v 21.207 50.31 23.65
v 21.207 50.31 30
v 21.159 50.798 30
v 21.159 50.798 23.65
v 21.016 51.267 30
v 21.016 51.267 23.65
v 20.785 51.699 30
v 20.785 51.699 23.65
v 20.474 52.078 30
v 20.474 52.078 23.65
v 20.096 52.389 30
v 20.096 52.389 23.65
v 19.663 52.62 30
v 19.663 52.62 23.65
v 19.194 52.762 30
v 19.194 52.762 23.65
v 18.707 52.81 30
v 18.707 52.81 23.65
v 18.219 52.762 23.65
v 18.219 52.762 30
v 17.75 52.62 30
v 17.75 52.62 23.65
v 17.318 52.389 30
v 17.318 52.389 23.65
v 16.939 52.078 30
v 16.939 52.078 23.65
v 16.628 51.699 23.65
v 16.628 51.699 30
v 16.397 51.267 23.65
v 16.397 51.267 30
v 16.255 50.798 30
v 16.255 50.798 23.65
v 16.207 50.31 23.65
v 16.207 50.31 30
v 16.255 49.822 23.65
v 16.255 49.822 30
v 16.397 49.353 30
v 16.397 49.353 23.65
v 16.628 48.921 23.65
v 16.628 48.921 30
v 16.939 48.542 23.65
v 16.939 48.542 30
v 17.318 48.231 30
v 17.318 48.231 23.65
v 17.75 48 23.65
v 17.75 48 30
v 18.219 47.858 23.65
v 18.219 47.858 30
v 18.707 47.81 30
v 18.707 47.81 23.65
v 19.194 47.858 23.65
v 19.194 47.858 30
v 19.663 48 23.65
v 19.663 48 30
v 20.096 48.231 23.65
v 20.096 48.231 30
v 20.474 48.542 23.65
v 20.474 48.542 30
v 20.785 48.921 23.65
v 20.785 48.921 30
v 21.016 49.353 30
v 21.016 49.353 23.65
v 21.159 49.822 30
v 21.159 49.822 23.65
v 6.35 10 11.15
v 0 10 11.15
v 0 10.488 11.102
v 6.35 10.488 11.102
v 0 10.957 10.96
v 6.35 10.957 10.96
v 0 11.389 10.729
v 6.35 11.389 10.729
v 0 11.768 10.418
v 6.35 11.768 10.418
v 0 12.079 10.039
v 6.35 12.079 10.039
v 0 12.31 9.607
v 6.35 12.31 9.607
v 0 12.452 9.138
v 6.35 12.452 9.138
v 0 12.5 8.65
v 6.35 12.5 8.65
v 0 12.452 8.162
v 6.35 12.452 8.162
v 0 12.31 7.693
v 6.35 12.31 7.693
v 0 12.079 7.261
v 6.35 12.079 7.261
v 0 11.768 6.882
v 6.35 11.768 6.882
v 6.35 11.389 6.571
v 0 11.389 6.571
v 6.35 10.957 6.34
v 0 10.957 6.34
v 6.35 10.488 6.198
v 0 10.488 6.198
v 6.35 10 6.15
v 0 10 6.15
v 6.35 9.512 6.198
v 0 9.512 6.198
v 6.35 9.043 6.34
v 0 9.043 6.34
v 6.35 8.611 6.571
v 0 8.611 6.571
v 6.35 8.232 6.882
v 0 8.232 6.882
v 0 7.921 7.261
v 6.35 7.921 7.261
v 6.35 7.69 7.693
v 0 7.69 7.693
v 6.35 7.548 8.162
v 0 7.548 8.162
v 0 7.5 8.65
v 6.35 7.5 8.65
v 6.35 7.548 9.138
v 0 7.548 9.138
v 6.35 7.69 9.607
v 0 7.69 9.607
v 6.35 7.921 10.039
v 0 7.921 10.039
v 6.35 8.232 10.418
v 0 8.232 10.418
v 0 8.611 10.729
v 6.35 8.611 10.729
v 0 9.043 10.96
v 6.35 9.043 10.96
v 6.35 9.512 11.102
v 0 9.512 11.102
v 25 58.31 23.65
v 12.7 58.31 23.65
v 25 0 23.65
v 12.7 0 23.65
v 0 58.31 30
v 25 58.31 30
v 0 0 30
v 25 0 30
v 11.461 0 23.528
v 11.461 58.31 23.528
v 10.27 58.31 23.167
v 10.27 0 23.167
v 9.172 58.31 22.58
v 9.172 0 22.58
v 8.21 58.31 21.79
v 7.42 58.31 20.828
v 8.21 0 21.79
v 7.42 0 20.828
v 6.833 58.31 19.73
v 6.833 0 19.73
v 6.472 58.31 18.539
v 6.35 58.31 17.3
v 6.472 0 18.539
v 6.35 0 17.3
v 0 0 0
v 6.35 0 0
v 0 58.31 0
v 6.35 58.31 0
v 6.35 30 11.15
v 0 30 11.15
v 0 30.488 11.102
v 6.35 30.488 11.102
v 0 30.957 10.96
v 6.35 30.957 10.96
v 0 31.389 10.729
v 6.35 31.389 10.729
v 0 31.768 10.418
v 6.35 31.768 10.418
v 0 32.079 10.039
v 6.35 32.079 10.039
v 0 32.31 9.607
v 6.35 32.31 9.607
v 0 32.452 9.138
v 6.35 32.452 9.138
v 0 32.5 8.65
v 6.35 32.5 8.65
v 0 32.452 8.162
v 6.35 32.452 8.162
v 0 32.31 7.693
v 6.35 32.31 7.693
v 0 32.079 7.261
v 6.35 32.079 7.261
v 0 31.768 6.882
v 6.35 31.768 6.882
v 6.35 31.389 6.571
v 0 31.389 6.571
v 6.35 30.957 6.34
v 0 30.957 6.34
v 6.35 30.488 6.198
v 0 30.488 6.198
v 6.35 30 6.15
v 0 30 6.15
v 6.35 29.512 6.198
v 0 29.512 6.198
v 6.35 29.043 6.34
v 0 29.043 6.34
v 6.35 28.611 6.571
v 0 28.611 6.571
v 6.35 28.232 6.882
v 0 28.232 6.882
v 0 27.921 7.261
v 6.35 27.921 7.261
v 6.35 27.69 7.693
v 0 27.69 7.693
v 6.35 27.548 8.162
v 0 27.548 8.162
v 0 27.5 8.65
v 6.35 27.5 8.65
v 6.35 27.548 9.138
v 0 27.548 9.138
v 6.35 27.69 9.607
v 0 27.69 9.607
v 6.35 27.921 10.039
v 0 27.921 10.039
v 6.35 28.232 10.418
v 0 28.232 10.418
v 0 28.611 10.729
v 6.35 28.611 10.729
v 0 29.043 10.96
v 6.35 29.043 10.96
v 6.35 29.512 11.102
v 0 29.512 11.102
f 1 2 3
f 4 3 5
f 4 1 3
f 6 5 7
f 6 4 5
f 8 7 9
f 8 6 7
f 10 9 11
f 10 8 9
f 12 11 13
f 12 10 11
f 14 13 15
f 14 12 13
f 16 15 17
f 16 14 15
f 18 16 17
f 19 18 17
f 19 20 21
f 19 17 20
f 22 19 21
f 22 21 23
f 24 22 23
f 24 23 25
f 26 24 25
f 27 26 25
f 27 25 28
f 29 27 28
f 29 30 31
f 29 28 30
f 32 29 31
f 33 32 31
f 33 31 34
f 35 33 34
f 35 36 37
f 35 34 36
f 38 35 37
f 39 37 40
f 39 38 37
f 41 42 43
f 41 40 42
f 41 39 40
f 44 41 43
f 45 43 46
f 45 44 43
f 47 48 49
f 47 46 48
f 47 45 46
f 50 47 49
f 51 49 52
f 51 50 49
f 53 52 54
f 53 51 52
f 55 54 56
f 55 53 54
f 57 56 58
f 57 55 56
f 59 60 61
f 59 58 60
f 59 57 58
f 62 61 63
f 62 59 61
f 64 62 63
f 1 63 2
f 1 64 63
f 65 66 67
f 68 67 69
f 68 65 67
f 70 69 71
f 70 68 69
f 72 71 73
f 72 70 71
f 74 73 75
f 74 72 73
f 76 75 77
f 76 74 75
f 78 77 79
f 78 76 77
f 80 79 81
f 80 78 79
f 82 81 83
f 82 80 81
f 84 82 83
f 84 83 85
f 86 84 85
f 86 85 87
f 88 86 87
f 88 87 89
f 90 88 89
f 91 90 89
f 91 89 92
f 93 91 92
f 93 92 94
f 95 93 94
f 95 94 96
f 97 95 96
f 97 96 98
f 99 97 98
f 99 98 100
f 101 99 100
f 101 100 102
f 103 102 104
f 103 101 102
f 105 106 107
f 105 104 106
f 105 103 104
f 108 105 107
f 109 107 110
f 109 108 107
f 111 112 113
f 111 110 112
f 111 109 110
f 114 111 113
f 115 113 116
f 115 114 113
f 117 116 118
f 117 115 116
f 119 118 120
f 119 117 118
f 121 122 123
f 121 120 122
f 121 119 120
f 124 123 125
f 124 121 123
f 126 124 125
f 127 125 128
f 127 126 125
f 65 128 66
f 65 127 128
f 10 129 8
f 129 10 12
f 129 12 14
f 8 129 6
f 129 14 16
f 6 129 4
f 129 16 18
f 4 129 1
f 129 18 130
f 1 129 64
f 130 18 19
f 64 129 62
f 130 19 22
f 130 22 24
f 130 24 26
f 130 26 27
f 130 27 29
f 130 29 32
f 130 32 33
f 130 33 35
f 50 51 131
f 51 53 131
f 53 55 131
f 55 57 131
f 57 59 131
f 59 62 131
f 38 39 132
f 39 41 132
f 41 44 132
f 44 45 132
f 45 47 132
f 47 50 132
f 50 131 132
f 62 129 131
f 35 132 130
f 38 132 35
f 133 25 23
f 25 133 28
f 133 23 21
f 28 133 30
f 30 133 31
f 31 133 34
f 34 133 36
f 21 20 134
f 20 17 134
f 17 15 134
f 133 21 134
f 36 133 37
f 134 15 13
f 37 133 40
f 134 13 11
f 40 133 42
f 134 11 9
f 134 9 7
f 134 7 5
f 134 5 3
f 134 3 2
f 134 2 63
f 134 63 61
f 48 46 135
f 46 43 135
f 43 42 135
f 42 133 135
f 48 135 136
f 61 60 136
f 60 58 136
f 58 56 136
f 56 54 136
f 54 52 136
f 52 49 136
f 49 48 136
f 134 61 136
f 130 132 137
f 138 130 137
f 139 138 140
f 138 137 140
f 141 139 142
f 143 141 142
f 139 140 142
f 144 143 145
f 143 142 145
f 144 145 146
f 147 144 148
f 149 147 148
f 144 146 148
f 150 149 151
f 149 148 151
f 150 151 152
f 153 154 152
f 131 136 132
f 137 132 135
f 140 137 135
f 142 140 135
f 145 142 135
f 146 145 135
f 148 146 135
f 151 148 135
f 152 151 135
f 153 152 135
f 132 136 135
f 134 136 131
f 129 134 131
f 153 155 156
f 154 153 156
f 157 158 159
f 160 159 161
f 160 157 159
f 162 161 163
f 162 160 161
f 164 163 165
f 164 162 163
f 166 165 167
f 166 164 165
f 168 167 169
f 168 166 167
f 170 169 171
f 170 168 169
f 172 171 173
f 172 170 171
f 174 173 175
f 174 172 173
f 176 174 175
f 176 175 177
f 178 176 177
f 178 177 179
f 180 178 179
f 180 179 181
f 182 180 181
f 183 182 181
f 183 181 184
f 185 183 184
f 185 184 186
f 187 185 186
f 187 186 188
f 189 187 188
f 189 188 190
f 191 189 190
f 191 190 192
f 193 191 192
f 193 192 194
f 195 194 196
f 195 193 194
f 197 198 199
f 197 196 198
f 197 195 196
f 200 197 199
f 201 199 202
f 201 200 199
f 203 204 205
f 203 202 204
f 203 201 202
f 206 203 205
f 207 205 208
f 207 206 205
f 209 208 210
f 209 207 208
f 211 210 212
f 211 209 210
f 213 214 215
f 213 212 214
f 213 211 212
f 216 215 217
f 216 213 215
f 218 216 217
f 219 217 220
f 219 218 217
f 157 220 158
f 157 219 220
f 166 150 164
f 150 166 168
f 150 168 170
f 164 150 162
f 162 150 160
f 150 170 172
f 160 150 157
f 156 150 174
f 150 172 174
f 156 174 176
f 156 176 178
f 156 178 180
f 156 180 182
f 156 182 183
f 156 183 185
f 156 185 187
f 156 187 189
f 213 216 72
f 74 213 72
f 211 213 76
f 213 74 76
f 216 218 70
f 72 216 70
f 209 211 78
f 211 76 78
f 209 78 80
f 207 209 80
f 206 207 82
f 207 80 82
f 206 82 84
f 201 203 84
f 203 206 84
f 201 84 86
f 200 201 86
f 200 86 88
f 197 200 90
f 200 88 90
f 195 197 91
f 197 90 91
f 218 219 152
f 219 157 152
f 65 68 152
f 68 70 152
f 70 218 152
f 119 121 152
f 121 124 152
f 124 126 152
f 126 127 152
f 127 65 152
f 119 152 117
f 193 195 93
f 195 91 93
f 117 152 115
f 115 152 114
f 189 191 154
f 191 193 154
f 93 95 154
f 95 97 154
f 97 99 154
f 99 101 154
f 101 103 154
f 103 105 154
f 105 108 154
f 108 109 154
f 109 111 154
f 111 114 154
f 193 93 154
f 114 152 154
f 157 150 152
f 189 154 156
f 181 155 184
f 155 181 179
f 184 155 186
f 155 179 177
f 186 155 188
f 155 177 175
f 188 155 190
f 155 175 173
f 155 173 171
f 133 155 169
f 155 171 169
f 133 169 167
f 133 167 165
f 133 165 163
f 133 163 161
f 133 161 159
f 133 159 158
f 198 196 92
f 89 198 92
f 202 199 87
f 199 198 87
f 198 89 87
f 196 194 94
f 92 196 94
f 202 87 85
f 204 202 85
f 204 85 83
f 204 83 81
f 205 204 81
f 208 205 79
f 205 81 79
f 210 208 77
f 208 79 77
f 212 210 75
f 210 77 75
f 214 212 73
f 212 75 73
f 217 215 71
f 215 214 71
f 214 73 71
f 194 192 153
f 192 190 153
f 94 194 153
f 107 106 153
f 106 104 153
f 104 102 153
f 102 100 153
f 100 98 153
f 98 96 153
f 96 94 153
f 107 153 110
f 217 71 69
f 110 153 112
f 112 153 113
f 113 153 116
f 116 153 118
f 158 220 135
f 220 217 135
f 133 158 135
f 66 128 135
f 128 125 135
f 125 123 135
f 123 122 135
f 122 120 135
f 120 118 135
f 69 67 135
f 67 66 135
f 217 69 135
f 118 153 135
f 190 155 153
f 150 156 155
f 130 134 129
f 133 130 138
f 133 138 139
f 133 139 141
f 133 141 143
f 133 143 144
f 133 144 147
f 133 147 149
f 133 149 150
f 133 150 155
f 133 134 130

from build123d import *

# Parameters (mm, degrees)
BOSS_EXTRUDE1_DEPTH = 58.31
SKETCH3_R           = 2.5
CUT_EXTRUDE1_DEPTH  = 7.35
SKETCH4_R           = 2.5
CUT_EXTRUDE2_DEPTH  = 7.35
SKETCH5_W           = 25
SKETCH5_H           = 30
CUT_EXTRUDE3_DEPTH  = 59.31


with BuildPart() as part:
    # Sketch2 → Boss-Extrude1 (new body)
    with BuildSketch(Plane(origin=(0, 0, 0), x_dir=(1, 0, 0), z_dir=(0, 1, 0))):
        with BuildLine():
            Line((0, 0), (0, 30))
            Line((0, 30), (25, 30))
            Line((25, 30), (25, 23.65))
            Line((25, 23.65), (12.7, 23.65))
            ThreePointArc((12.7, 23.65), (8.209871939, 21.790128061), (6.35, 17.3))
            Line((6.35, 17.3), (6.35, 0))
            Line((6.35, 0), (0, 0))
        make_face()
    boss_extrude1 = extrude(amount=BOSS_EXTRUDE1_DEPTH)

    # Sketch3 → Cut-Extrude1 (cut, through all)
    with BuildSketch(Plane(origin=(6.35, 0, 0), x_dir=(0, 0, -1), z_dir=(1, 0, 0))):
        with Locations((8.65, 10)):
            Circle(SKETCH3_R)
        with Locations((8.65, 30)):
            Circle(SKETCH3_R)
    cut_extrude1 = extrude(amount=-CUT_EXTRUDE1_DEPTH, mode=Mode.SUBTRACT)

    # Sketch4 → Cut-Extrude2 (cut, through all)
    with BuildSketch(Plane.XY.offset(-23.65)):
        with Locations((18.706720962, 50.31)):
            Circle(SKETCH4_R)
    cut_extrude2 = extrude(amount=-CUT_EXTRUDE2_DEPTH, mode=Mode.SUBTRACT)

    # Mirror1: Boss-Extrude1, Cut-Extrude1, Cut-Extrude2 across plane
    add(boss_extrude1.mirror(Plane(origin=(0, 58.31, 0), x_dir=(1, 0, 0), z_dir=(0, 0, -1))))
    add(cut_extrude1.mirror(Plane(origin=(0, 58.31, 0), x_dir=(1, 0, 0), z_dir=(0, 0, -1))), mode=Mode.SUBTRACT)
    add(cut_extrude2.mirror(Plane(origin=(0, 58.31, 0), x_dir=(1, 0, 0), z_dir=(0, 0, -1))), mode=Mode.SUBTRACT)

    # Sketch5 → Cut-Extrude3 (cut, through all)
    with BuildSketch(Plane(origin=(0, 58.31, 0), x_dir=(1, 0, 0), z_dir=(0, 1, 0))):
        with Locations((12.5, 15)):
            Rectangle(SKETCH5_W, SKETCH5_H)
    extrude(amount=-CUT_EXTRUDE3_DEPTH, mode=Mode.SUBTRACT)


solid = part.part
